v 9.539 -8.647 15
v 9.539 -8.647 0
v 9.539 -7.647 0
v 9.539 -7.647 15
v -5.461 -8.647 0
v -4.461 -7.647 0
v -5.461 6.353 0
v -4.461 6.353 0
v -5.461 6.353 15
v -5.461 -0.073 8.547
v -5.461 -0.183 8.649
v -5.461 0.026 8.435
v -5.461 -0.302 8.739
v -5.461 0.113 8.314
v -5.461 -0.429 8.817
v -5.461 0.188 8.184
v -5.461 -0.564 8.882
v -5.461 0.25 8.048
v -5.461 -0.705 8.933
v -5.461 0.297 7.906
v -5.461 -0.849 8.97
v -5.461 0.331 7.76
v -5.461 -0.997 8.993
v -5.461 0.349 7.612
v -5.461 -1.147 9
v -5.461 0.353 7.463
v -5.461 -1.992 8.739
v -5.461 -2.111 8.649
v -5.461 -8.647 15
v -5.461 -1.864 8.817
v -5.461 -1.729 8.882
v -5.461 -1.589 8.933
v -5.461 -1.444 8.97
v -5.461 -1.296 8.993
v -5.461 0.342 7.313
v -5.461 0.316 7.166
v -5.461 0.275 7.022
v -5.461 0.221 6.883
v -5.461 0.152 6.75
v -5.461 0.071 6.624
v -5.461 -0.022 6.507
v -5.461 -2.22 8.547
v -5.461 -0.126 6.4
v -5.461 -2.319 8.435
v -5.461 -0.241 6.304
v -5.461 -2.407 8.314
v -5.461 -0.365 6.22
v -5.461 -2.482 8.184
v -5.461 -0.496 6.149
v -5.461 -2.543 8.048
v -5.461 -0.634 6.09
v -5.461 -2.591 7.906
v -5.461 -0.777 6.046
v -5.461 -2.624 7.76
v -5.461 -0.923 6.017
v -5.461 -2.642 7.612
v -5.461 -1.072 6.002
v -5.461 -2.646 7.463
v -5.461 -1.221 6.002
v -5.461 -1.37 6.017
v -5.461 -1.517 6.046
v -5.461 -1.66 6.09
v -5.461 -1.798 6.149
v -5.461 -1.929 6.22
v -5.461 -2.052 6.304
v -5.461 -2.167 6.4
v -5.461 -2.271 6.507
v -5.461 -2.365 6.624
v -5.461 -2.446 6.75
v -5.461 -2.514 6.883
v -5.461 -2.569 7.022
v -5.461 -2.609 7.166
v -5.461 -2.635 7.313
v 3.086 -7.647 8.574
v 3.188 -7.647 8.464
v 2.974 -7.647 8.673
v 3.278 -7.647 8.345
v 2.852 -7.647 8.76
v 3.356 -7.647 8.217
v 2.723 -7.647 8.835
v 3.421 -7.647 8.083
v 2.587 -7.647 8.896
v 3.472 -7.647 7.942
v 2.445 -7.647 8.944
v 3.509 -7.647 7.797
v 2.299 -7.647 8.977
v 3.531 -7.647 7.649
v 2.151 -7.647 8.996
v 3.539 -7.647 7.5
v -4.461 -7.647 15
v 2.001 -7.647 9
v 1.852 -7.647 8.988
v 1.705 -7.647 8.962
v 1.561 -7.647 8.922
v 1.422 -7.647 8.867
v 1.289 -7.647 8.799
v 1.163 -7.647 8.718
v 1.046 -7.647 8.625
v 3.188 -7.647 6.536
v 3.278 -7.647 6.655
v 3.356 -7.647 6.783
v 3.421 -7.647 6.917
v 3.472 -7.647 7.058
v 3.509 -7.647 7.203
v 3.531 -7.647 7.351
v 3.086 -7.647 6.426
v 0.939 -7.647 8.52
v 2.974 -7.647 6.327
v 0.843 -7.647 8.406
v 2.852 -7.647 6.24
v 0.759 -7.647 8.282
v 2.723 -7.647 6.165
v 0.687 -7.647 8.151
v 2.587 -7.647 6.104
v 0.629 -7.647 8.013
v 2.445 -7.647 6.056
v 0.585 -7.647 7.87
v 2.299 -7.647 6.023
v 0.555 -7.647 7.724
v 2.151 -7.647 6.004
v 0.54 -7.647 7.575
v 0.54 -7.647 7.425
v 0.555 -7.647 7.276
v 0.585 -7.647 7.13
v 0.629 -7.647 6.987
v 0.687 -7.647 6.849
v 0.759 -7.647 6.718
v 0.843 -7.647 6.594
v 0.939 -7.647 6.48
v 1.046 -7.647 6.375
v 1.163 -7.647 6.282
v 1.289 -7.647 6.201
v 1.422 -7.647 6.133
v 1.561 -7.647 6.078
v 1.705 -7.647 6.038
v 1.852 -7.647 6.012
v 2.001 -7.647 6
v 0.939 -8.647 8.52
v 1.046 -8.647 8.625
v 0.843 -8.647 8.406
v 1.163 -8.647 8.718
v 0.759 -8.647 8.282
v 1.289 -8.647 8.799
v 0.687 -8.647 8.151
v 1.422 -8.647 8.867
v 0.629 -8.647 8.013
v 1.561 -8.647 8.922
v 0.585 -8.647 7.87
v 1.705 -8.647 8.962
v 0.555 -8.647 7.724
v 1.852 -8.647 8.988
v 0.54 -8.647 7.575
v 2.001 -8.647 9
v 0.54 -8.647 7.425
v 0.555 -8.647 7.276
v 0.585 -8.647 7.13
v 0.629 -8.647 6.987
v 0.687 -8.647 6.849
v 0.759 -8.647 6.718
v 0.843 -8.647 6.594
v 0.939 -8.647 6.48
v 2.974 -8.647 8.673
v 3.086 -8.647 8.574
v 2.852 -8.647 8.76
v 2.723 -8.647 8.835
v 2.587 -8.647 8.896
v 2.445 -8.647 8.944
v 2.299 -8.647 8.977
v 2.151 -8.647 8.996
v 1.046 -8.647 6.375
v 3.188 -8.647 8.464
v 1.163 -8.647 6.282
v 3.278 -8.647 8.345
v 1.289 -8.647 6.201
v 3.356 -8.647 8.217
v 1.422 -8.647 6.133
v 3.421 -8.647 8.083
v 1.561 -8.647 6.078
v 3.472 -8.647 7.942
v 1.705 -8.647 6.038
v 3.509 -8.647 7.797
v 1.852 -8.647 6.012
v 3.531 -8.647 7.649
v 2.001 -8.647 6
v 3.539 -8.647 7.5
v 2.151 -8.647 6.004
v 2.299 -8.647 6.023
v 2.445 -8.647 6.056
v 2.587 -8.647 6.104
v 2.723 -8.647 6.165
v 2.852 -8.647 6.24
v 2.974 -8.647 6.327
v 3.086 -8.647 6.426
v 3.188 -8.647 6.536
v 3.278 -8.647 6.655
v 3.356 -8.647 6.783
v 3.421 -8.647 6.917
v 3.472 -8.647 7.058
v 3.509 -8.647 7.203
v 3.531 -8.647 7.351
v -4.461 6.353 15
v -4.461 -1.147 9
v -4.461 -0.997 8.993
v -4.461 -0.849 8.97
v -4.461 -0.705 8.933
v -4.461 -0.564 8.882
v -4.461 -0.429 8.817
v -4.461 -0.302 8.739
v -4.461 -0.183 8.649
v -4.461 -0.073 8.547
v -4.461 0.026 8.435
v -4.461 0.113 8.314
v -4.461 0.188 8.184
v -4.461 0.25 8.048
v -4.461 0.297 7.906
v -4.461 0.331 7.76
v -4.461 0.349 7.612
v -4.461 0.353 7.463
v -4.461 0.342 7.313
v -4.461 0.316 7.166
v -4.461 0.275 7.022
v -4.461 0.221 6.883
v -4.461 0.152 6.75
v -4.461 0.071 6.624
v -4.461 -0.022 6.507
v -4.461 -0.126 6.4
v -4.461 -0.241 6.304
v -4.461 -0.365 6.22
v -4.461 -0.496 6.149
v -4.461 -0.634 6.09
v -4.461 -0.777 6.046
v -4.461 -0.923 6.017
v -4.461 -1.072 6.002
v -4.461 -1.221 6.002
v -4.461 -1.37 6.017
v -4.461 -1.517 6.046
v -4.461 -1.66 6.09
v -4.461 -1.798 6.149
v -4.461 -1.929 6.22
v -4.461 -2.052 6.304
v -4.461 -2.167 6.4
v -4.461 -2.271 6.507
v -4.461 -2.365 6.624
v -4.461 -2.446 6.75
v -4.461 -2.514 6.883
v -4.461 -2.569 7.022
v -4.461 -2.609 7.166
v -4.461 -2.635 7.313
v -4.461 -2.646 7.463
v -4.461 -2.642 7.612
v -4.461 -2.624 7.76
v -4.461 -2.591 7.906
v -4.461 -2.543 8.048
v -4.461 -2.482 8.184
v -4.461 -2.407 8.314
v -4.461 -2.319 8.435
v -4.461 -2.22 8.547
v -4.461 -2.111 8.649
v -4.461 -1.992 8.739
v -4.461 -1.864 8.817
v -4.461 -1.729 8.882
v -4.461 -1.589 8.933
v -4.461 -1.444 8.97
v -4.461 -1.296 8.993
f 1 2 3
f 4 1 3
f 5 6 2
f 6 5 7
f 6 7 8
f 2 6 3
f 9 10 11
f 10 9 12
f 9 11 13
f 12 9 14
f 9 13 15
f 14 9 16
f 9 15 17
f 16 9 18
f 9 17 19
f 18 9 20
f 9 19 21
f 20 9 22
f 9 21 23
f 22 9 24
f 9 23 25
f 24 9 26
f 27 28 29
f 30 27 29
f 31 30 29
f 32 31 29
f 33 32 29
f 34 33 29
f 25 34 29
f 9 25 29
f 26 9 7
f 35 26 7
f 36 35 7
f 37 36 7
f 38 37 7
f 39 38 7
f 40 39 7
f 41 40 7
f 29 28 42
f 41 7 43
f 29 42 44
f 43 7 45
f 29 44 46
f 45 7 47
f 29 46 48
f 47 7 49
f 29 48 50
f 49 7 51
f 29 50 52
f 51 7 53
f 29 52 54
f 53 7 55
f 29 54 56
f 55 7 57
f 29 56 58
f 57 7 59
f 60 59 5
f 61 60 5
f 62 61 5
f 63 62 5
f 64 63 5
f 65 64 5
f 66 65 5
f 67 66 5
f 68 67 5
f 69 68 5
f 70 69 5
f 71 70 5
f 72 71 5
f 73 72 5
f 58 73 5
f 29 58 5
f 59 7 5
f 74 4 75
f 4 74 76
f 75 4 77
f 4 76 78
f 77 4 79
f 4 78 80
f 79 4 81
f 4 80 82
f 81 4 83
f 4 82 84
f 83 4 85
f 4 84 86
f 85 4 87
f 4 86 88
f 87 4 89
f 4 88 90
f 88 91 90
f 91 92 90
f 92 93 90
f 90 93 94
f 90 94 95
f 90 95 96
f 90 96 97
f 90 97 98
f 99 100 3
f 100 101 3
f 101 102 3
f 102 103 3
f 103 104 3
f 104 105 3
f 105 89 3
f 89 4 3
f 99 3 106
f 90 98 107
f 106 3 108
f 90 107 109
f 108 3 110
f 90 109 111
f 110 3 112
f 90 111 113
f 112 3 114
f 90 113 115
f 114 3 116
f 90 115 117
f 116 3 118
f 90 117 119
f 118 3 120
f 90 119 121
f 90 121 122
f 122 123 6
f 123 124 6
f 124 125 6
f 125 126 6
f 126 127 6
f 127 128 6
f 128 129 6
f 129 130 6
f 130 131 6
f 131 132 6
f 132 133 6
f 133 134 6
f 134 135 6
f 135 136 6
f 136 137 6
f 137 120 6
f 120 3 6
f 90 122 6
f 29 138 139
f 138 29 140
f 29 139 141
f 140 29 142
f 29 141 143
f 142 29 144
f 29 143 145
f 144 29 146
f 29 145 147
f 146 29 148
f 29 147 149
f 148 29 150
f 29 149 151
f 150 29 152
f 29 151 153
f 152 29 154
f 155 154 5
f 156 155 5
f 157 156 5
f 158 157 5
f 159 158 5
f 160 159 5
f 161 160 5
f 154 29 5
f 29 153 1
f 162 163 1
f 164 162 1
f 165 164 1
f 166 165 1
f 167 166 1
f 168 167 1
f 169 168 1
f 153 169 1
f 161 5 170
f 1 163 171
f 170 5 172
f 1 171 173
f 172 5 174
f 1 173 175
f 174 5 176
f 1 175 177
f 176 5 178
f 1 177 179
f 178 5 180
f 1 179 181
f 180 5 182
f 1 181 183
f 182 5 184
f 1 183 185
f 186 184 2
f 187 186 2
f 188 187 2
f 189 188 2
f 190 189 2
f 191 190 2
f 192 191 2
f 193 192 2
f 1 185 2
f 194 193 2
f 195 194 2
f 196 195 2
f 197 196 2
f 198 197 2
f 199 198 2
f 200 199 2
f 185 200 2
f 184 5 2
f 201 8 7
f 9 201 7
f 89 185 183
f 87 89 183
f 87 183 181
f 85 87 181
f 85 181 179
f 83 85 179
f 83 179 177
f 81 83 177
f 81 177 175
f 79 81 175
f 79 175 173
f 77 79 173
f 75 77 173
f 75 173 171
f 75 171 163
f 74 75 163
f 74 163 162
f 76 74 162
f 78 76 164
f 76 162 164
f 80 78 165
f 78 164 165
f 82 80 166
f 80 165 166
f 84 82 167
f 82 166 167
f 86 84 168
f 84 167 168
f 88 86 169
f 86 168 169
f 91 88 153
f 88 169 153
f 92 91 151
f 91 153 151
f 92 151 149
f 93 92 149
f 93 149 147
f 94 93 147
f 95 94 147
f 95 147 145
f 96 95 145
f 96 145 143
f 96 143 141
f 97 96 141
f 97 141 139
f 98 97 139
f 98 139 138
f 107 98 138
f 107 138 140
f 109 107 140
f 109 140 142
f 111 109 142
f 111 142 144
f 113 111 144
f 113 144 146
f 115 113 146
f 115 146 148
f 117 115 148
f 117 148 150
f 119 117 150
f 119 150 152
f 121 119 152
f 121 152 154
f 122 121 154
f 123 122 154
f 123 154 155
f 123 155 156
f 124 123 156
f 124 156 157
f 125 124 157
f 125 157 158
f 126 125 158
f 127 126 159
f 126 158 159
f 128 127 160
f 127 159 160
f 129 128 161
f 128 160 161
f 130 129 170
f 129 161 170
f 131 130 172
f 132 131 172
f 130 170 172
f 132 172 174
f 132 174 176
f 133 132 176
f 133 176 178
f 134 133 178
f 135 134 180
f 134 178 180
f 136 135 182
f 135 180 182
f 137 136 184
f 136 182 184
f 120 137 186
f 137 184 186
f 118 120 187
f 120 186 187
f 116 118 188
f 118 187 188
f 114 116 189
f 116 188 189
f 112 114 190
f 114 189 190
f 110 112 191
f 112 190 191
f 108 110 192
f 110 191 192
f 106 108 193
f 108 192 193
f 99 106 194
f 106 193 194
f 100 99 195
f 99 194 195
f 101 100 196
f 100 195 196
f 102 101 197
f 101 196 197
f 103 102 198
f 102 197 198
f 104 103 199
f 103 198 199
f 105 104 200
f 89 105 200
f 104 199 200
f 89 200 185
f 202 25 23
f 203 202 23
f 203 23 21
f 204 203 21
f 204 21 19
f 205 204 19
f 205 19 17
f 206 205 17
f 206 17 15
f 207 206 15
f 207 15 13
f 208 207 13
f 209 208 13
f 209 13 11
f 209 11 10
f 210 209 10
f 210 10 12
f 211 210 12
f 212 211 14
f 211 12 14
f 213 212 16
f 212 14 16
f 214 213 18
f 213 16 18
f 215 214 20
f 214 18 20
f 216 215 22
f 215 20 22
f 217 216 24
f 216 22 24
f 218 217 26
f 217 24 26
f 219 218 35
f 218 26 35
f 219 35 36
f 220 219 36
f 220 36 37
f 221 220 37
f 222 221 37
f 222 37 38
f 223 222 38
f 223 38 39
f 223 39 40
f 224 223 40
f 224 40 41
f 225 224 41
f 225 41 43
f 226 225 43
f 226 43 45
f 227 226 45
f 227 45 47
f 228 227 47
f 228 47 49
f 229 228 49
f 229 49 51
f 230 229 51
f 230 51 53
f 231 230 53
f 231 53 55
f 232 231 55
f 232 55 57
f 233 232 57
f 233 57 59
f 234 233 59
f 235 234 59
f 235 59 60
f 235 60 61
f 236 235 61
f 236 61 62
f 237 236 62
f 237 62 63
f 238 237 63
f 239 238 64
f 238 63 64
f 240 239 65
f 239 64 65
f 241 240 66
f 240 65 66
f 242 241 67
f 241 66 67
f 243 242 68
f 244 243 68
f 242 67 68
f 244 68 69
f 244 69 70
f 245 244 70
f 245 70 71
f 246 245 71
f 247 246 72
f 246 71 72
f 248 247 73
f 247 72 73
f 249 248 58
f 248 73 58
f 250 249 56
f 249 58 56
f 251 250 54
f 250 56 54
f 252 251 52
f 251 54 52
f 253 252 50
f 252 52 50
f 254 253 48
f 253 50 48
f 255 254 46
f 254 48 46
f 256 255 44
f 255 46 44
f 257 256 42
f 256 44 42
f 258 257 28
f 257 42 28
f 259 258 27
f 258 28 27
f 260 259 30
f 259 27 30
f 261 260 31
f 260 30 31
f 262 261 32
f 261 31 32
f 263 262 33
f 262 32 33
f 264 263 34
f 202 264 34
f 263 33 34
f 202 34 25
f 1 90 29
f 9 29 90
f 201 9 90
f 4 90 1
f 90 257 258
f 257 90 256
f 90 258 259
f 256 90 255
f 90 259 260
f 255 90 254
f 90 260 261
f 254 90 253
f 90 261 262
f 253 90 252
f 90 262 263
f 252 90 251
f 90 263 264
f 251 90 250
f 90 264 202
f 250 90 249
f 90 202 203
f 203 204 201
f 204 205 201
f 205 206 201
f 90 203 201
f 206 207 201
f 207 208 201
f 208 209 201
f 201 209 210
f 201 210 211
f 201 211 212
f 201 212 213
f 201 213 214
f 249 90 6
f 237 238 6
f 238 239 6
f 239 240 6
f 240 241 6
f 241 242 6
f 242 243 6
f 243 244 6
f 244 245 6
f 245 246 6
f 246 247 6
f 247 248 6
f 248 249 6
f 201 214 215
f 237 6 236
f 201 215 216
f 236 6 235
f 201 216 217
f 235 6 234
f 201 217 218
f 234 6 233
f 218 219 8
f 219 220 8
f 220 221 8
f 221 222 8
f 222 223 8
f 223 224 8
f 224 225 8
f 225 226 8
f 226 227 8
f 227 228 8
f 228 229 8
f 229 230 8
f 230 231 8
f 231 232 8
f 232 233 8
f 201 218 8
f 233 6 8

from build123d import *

# Parameters (mm, degrees)
EXTRUDE_1_DEPTH     = 15
SKETCH_2_R          = 1.5
CUT_EXTRUDE_1_DEPTH = 10
SKETCH_3_R          = 1.5
CUT_EXTRUDE_2_DEPTH = 10


with BuildPart() as part:
    # ｽｹｯﾁ1 → ﾎﾞｽ - 押し出し1 (new body)
    with BuildSketch(Plane.XY):
        Polygon((-4.461455774, 6.353305785), (-5.461455774, 6.353305785), (-5.461455774, -8.646694215), (9.538544226, -8.646694215), (9.538544226, -7.646694215), (-4.461455774, -7.646694215), align=None)
    extrude(amount=EXTRUDE_1_DEPTH)

    # ｽｹｯﾁ2 → ｶｯﾄ - 押し出し1 (cut)
    with BuildSketch(Plane.ZY.offset(5.461455774)):
        with Locations((7.5, -1.146694215)):
            Circle(SKETCH_2_R)
    extrude(amount=-CUT_EXTRUDE_1_DEPTH, mode=Mode.SUBTRACT)

    # ｽｹｯﾁ3 → ｶｯﾄ - 押し出し2 (cut)
    with BuildSketch(Plane.XZ.offset(8.646694215)):
        with Locations((2.038544226, 7.5)):
            Circle(SKETCH_3_R)
    extrude(amount=-CUT_EXTRUDE_2_DEPTH, mode=Mode.SUBTRACT)


solid = part.part
